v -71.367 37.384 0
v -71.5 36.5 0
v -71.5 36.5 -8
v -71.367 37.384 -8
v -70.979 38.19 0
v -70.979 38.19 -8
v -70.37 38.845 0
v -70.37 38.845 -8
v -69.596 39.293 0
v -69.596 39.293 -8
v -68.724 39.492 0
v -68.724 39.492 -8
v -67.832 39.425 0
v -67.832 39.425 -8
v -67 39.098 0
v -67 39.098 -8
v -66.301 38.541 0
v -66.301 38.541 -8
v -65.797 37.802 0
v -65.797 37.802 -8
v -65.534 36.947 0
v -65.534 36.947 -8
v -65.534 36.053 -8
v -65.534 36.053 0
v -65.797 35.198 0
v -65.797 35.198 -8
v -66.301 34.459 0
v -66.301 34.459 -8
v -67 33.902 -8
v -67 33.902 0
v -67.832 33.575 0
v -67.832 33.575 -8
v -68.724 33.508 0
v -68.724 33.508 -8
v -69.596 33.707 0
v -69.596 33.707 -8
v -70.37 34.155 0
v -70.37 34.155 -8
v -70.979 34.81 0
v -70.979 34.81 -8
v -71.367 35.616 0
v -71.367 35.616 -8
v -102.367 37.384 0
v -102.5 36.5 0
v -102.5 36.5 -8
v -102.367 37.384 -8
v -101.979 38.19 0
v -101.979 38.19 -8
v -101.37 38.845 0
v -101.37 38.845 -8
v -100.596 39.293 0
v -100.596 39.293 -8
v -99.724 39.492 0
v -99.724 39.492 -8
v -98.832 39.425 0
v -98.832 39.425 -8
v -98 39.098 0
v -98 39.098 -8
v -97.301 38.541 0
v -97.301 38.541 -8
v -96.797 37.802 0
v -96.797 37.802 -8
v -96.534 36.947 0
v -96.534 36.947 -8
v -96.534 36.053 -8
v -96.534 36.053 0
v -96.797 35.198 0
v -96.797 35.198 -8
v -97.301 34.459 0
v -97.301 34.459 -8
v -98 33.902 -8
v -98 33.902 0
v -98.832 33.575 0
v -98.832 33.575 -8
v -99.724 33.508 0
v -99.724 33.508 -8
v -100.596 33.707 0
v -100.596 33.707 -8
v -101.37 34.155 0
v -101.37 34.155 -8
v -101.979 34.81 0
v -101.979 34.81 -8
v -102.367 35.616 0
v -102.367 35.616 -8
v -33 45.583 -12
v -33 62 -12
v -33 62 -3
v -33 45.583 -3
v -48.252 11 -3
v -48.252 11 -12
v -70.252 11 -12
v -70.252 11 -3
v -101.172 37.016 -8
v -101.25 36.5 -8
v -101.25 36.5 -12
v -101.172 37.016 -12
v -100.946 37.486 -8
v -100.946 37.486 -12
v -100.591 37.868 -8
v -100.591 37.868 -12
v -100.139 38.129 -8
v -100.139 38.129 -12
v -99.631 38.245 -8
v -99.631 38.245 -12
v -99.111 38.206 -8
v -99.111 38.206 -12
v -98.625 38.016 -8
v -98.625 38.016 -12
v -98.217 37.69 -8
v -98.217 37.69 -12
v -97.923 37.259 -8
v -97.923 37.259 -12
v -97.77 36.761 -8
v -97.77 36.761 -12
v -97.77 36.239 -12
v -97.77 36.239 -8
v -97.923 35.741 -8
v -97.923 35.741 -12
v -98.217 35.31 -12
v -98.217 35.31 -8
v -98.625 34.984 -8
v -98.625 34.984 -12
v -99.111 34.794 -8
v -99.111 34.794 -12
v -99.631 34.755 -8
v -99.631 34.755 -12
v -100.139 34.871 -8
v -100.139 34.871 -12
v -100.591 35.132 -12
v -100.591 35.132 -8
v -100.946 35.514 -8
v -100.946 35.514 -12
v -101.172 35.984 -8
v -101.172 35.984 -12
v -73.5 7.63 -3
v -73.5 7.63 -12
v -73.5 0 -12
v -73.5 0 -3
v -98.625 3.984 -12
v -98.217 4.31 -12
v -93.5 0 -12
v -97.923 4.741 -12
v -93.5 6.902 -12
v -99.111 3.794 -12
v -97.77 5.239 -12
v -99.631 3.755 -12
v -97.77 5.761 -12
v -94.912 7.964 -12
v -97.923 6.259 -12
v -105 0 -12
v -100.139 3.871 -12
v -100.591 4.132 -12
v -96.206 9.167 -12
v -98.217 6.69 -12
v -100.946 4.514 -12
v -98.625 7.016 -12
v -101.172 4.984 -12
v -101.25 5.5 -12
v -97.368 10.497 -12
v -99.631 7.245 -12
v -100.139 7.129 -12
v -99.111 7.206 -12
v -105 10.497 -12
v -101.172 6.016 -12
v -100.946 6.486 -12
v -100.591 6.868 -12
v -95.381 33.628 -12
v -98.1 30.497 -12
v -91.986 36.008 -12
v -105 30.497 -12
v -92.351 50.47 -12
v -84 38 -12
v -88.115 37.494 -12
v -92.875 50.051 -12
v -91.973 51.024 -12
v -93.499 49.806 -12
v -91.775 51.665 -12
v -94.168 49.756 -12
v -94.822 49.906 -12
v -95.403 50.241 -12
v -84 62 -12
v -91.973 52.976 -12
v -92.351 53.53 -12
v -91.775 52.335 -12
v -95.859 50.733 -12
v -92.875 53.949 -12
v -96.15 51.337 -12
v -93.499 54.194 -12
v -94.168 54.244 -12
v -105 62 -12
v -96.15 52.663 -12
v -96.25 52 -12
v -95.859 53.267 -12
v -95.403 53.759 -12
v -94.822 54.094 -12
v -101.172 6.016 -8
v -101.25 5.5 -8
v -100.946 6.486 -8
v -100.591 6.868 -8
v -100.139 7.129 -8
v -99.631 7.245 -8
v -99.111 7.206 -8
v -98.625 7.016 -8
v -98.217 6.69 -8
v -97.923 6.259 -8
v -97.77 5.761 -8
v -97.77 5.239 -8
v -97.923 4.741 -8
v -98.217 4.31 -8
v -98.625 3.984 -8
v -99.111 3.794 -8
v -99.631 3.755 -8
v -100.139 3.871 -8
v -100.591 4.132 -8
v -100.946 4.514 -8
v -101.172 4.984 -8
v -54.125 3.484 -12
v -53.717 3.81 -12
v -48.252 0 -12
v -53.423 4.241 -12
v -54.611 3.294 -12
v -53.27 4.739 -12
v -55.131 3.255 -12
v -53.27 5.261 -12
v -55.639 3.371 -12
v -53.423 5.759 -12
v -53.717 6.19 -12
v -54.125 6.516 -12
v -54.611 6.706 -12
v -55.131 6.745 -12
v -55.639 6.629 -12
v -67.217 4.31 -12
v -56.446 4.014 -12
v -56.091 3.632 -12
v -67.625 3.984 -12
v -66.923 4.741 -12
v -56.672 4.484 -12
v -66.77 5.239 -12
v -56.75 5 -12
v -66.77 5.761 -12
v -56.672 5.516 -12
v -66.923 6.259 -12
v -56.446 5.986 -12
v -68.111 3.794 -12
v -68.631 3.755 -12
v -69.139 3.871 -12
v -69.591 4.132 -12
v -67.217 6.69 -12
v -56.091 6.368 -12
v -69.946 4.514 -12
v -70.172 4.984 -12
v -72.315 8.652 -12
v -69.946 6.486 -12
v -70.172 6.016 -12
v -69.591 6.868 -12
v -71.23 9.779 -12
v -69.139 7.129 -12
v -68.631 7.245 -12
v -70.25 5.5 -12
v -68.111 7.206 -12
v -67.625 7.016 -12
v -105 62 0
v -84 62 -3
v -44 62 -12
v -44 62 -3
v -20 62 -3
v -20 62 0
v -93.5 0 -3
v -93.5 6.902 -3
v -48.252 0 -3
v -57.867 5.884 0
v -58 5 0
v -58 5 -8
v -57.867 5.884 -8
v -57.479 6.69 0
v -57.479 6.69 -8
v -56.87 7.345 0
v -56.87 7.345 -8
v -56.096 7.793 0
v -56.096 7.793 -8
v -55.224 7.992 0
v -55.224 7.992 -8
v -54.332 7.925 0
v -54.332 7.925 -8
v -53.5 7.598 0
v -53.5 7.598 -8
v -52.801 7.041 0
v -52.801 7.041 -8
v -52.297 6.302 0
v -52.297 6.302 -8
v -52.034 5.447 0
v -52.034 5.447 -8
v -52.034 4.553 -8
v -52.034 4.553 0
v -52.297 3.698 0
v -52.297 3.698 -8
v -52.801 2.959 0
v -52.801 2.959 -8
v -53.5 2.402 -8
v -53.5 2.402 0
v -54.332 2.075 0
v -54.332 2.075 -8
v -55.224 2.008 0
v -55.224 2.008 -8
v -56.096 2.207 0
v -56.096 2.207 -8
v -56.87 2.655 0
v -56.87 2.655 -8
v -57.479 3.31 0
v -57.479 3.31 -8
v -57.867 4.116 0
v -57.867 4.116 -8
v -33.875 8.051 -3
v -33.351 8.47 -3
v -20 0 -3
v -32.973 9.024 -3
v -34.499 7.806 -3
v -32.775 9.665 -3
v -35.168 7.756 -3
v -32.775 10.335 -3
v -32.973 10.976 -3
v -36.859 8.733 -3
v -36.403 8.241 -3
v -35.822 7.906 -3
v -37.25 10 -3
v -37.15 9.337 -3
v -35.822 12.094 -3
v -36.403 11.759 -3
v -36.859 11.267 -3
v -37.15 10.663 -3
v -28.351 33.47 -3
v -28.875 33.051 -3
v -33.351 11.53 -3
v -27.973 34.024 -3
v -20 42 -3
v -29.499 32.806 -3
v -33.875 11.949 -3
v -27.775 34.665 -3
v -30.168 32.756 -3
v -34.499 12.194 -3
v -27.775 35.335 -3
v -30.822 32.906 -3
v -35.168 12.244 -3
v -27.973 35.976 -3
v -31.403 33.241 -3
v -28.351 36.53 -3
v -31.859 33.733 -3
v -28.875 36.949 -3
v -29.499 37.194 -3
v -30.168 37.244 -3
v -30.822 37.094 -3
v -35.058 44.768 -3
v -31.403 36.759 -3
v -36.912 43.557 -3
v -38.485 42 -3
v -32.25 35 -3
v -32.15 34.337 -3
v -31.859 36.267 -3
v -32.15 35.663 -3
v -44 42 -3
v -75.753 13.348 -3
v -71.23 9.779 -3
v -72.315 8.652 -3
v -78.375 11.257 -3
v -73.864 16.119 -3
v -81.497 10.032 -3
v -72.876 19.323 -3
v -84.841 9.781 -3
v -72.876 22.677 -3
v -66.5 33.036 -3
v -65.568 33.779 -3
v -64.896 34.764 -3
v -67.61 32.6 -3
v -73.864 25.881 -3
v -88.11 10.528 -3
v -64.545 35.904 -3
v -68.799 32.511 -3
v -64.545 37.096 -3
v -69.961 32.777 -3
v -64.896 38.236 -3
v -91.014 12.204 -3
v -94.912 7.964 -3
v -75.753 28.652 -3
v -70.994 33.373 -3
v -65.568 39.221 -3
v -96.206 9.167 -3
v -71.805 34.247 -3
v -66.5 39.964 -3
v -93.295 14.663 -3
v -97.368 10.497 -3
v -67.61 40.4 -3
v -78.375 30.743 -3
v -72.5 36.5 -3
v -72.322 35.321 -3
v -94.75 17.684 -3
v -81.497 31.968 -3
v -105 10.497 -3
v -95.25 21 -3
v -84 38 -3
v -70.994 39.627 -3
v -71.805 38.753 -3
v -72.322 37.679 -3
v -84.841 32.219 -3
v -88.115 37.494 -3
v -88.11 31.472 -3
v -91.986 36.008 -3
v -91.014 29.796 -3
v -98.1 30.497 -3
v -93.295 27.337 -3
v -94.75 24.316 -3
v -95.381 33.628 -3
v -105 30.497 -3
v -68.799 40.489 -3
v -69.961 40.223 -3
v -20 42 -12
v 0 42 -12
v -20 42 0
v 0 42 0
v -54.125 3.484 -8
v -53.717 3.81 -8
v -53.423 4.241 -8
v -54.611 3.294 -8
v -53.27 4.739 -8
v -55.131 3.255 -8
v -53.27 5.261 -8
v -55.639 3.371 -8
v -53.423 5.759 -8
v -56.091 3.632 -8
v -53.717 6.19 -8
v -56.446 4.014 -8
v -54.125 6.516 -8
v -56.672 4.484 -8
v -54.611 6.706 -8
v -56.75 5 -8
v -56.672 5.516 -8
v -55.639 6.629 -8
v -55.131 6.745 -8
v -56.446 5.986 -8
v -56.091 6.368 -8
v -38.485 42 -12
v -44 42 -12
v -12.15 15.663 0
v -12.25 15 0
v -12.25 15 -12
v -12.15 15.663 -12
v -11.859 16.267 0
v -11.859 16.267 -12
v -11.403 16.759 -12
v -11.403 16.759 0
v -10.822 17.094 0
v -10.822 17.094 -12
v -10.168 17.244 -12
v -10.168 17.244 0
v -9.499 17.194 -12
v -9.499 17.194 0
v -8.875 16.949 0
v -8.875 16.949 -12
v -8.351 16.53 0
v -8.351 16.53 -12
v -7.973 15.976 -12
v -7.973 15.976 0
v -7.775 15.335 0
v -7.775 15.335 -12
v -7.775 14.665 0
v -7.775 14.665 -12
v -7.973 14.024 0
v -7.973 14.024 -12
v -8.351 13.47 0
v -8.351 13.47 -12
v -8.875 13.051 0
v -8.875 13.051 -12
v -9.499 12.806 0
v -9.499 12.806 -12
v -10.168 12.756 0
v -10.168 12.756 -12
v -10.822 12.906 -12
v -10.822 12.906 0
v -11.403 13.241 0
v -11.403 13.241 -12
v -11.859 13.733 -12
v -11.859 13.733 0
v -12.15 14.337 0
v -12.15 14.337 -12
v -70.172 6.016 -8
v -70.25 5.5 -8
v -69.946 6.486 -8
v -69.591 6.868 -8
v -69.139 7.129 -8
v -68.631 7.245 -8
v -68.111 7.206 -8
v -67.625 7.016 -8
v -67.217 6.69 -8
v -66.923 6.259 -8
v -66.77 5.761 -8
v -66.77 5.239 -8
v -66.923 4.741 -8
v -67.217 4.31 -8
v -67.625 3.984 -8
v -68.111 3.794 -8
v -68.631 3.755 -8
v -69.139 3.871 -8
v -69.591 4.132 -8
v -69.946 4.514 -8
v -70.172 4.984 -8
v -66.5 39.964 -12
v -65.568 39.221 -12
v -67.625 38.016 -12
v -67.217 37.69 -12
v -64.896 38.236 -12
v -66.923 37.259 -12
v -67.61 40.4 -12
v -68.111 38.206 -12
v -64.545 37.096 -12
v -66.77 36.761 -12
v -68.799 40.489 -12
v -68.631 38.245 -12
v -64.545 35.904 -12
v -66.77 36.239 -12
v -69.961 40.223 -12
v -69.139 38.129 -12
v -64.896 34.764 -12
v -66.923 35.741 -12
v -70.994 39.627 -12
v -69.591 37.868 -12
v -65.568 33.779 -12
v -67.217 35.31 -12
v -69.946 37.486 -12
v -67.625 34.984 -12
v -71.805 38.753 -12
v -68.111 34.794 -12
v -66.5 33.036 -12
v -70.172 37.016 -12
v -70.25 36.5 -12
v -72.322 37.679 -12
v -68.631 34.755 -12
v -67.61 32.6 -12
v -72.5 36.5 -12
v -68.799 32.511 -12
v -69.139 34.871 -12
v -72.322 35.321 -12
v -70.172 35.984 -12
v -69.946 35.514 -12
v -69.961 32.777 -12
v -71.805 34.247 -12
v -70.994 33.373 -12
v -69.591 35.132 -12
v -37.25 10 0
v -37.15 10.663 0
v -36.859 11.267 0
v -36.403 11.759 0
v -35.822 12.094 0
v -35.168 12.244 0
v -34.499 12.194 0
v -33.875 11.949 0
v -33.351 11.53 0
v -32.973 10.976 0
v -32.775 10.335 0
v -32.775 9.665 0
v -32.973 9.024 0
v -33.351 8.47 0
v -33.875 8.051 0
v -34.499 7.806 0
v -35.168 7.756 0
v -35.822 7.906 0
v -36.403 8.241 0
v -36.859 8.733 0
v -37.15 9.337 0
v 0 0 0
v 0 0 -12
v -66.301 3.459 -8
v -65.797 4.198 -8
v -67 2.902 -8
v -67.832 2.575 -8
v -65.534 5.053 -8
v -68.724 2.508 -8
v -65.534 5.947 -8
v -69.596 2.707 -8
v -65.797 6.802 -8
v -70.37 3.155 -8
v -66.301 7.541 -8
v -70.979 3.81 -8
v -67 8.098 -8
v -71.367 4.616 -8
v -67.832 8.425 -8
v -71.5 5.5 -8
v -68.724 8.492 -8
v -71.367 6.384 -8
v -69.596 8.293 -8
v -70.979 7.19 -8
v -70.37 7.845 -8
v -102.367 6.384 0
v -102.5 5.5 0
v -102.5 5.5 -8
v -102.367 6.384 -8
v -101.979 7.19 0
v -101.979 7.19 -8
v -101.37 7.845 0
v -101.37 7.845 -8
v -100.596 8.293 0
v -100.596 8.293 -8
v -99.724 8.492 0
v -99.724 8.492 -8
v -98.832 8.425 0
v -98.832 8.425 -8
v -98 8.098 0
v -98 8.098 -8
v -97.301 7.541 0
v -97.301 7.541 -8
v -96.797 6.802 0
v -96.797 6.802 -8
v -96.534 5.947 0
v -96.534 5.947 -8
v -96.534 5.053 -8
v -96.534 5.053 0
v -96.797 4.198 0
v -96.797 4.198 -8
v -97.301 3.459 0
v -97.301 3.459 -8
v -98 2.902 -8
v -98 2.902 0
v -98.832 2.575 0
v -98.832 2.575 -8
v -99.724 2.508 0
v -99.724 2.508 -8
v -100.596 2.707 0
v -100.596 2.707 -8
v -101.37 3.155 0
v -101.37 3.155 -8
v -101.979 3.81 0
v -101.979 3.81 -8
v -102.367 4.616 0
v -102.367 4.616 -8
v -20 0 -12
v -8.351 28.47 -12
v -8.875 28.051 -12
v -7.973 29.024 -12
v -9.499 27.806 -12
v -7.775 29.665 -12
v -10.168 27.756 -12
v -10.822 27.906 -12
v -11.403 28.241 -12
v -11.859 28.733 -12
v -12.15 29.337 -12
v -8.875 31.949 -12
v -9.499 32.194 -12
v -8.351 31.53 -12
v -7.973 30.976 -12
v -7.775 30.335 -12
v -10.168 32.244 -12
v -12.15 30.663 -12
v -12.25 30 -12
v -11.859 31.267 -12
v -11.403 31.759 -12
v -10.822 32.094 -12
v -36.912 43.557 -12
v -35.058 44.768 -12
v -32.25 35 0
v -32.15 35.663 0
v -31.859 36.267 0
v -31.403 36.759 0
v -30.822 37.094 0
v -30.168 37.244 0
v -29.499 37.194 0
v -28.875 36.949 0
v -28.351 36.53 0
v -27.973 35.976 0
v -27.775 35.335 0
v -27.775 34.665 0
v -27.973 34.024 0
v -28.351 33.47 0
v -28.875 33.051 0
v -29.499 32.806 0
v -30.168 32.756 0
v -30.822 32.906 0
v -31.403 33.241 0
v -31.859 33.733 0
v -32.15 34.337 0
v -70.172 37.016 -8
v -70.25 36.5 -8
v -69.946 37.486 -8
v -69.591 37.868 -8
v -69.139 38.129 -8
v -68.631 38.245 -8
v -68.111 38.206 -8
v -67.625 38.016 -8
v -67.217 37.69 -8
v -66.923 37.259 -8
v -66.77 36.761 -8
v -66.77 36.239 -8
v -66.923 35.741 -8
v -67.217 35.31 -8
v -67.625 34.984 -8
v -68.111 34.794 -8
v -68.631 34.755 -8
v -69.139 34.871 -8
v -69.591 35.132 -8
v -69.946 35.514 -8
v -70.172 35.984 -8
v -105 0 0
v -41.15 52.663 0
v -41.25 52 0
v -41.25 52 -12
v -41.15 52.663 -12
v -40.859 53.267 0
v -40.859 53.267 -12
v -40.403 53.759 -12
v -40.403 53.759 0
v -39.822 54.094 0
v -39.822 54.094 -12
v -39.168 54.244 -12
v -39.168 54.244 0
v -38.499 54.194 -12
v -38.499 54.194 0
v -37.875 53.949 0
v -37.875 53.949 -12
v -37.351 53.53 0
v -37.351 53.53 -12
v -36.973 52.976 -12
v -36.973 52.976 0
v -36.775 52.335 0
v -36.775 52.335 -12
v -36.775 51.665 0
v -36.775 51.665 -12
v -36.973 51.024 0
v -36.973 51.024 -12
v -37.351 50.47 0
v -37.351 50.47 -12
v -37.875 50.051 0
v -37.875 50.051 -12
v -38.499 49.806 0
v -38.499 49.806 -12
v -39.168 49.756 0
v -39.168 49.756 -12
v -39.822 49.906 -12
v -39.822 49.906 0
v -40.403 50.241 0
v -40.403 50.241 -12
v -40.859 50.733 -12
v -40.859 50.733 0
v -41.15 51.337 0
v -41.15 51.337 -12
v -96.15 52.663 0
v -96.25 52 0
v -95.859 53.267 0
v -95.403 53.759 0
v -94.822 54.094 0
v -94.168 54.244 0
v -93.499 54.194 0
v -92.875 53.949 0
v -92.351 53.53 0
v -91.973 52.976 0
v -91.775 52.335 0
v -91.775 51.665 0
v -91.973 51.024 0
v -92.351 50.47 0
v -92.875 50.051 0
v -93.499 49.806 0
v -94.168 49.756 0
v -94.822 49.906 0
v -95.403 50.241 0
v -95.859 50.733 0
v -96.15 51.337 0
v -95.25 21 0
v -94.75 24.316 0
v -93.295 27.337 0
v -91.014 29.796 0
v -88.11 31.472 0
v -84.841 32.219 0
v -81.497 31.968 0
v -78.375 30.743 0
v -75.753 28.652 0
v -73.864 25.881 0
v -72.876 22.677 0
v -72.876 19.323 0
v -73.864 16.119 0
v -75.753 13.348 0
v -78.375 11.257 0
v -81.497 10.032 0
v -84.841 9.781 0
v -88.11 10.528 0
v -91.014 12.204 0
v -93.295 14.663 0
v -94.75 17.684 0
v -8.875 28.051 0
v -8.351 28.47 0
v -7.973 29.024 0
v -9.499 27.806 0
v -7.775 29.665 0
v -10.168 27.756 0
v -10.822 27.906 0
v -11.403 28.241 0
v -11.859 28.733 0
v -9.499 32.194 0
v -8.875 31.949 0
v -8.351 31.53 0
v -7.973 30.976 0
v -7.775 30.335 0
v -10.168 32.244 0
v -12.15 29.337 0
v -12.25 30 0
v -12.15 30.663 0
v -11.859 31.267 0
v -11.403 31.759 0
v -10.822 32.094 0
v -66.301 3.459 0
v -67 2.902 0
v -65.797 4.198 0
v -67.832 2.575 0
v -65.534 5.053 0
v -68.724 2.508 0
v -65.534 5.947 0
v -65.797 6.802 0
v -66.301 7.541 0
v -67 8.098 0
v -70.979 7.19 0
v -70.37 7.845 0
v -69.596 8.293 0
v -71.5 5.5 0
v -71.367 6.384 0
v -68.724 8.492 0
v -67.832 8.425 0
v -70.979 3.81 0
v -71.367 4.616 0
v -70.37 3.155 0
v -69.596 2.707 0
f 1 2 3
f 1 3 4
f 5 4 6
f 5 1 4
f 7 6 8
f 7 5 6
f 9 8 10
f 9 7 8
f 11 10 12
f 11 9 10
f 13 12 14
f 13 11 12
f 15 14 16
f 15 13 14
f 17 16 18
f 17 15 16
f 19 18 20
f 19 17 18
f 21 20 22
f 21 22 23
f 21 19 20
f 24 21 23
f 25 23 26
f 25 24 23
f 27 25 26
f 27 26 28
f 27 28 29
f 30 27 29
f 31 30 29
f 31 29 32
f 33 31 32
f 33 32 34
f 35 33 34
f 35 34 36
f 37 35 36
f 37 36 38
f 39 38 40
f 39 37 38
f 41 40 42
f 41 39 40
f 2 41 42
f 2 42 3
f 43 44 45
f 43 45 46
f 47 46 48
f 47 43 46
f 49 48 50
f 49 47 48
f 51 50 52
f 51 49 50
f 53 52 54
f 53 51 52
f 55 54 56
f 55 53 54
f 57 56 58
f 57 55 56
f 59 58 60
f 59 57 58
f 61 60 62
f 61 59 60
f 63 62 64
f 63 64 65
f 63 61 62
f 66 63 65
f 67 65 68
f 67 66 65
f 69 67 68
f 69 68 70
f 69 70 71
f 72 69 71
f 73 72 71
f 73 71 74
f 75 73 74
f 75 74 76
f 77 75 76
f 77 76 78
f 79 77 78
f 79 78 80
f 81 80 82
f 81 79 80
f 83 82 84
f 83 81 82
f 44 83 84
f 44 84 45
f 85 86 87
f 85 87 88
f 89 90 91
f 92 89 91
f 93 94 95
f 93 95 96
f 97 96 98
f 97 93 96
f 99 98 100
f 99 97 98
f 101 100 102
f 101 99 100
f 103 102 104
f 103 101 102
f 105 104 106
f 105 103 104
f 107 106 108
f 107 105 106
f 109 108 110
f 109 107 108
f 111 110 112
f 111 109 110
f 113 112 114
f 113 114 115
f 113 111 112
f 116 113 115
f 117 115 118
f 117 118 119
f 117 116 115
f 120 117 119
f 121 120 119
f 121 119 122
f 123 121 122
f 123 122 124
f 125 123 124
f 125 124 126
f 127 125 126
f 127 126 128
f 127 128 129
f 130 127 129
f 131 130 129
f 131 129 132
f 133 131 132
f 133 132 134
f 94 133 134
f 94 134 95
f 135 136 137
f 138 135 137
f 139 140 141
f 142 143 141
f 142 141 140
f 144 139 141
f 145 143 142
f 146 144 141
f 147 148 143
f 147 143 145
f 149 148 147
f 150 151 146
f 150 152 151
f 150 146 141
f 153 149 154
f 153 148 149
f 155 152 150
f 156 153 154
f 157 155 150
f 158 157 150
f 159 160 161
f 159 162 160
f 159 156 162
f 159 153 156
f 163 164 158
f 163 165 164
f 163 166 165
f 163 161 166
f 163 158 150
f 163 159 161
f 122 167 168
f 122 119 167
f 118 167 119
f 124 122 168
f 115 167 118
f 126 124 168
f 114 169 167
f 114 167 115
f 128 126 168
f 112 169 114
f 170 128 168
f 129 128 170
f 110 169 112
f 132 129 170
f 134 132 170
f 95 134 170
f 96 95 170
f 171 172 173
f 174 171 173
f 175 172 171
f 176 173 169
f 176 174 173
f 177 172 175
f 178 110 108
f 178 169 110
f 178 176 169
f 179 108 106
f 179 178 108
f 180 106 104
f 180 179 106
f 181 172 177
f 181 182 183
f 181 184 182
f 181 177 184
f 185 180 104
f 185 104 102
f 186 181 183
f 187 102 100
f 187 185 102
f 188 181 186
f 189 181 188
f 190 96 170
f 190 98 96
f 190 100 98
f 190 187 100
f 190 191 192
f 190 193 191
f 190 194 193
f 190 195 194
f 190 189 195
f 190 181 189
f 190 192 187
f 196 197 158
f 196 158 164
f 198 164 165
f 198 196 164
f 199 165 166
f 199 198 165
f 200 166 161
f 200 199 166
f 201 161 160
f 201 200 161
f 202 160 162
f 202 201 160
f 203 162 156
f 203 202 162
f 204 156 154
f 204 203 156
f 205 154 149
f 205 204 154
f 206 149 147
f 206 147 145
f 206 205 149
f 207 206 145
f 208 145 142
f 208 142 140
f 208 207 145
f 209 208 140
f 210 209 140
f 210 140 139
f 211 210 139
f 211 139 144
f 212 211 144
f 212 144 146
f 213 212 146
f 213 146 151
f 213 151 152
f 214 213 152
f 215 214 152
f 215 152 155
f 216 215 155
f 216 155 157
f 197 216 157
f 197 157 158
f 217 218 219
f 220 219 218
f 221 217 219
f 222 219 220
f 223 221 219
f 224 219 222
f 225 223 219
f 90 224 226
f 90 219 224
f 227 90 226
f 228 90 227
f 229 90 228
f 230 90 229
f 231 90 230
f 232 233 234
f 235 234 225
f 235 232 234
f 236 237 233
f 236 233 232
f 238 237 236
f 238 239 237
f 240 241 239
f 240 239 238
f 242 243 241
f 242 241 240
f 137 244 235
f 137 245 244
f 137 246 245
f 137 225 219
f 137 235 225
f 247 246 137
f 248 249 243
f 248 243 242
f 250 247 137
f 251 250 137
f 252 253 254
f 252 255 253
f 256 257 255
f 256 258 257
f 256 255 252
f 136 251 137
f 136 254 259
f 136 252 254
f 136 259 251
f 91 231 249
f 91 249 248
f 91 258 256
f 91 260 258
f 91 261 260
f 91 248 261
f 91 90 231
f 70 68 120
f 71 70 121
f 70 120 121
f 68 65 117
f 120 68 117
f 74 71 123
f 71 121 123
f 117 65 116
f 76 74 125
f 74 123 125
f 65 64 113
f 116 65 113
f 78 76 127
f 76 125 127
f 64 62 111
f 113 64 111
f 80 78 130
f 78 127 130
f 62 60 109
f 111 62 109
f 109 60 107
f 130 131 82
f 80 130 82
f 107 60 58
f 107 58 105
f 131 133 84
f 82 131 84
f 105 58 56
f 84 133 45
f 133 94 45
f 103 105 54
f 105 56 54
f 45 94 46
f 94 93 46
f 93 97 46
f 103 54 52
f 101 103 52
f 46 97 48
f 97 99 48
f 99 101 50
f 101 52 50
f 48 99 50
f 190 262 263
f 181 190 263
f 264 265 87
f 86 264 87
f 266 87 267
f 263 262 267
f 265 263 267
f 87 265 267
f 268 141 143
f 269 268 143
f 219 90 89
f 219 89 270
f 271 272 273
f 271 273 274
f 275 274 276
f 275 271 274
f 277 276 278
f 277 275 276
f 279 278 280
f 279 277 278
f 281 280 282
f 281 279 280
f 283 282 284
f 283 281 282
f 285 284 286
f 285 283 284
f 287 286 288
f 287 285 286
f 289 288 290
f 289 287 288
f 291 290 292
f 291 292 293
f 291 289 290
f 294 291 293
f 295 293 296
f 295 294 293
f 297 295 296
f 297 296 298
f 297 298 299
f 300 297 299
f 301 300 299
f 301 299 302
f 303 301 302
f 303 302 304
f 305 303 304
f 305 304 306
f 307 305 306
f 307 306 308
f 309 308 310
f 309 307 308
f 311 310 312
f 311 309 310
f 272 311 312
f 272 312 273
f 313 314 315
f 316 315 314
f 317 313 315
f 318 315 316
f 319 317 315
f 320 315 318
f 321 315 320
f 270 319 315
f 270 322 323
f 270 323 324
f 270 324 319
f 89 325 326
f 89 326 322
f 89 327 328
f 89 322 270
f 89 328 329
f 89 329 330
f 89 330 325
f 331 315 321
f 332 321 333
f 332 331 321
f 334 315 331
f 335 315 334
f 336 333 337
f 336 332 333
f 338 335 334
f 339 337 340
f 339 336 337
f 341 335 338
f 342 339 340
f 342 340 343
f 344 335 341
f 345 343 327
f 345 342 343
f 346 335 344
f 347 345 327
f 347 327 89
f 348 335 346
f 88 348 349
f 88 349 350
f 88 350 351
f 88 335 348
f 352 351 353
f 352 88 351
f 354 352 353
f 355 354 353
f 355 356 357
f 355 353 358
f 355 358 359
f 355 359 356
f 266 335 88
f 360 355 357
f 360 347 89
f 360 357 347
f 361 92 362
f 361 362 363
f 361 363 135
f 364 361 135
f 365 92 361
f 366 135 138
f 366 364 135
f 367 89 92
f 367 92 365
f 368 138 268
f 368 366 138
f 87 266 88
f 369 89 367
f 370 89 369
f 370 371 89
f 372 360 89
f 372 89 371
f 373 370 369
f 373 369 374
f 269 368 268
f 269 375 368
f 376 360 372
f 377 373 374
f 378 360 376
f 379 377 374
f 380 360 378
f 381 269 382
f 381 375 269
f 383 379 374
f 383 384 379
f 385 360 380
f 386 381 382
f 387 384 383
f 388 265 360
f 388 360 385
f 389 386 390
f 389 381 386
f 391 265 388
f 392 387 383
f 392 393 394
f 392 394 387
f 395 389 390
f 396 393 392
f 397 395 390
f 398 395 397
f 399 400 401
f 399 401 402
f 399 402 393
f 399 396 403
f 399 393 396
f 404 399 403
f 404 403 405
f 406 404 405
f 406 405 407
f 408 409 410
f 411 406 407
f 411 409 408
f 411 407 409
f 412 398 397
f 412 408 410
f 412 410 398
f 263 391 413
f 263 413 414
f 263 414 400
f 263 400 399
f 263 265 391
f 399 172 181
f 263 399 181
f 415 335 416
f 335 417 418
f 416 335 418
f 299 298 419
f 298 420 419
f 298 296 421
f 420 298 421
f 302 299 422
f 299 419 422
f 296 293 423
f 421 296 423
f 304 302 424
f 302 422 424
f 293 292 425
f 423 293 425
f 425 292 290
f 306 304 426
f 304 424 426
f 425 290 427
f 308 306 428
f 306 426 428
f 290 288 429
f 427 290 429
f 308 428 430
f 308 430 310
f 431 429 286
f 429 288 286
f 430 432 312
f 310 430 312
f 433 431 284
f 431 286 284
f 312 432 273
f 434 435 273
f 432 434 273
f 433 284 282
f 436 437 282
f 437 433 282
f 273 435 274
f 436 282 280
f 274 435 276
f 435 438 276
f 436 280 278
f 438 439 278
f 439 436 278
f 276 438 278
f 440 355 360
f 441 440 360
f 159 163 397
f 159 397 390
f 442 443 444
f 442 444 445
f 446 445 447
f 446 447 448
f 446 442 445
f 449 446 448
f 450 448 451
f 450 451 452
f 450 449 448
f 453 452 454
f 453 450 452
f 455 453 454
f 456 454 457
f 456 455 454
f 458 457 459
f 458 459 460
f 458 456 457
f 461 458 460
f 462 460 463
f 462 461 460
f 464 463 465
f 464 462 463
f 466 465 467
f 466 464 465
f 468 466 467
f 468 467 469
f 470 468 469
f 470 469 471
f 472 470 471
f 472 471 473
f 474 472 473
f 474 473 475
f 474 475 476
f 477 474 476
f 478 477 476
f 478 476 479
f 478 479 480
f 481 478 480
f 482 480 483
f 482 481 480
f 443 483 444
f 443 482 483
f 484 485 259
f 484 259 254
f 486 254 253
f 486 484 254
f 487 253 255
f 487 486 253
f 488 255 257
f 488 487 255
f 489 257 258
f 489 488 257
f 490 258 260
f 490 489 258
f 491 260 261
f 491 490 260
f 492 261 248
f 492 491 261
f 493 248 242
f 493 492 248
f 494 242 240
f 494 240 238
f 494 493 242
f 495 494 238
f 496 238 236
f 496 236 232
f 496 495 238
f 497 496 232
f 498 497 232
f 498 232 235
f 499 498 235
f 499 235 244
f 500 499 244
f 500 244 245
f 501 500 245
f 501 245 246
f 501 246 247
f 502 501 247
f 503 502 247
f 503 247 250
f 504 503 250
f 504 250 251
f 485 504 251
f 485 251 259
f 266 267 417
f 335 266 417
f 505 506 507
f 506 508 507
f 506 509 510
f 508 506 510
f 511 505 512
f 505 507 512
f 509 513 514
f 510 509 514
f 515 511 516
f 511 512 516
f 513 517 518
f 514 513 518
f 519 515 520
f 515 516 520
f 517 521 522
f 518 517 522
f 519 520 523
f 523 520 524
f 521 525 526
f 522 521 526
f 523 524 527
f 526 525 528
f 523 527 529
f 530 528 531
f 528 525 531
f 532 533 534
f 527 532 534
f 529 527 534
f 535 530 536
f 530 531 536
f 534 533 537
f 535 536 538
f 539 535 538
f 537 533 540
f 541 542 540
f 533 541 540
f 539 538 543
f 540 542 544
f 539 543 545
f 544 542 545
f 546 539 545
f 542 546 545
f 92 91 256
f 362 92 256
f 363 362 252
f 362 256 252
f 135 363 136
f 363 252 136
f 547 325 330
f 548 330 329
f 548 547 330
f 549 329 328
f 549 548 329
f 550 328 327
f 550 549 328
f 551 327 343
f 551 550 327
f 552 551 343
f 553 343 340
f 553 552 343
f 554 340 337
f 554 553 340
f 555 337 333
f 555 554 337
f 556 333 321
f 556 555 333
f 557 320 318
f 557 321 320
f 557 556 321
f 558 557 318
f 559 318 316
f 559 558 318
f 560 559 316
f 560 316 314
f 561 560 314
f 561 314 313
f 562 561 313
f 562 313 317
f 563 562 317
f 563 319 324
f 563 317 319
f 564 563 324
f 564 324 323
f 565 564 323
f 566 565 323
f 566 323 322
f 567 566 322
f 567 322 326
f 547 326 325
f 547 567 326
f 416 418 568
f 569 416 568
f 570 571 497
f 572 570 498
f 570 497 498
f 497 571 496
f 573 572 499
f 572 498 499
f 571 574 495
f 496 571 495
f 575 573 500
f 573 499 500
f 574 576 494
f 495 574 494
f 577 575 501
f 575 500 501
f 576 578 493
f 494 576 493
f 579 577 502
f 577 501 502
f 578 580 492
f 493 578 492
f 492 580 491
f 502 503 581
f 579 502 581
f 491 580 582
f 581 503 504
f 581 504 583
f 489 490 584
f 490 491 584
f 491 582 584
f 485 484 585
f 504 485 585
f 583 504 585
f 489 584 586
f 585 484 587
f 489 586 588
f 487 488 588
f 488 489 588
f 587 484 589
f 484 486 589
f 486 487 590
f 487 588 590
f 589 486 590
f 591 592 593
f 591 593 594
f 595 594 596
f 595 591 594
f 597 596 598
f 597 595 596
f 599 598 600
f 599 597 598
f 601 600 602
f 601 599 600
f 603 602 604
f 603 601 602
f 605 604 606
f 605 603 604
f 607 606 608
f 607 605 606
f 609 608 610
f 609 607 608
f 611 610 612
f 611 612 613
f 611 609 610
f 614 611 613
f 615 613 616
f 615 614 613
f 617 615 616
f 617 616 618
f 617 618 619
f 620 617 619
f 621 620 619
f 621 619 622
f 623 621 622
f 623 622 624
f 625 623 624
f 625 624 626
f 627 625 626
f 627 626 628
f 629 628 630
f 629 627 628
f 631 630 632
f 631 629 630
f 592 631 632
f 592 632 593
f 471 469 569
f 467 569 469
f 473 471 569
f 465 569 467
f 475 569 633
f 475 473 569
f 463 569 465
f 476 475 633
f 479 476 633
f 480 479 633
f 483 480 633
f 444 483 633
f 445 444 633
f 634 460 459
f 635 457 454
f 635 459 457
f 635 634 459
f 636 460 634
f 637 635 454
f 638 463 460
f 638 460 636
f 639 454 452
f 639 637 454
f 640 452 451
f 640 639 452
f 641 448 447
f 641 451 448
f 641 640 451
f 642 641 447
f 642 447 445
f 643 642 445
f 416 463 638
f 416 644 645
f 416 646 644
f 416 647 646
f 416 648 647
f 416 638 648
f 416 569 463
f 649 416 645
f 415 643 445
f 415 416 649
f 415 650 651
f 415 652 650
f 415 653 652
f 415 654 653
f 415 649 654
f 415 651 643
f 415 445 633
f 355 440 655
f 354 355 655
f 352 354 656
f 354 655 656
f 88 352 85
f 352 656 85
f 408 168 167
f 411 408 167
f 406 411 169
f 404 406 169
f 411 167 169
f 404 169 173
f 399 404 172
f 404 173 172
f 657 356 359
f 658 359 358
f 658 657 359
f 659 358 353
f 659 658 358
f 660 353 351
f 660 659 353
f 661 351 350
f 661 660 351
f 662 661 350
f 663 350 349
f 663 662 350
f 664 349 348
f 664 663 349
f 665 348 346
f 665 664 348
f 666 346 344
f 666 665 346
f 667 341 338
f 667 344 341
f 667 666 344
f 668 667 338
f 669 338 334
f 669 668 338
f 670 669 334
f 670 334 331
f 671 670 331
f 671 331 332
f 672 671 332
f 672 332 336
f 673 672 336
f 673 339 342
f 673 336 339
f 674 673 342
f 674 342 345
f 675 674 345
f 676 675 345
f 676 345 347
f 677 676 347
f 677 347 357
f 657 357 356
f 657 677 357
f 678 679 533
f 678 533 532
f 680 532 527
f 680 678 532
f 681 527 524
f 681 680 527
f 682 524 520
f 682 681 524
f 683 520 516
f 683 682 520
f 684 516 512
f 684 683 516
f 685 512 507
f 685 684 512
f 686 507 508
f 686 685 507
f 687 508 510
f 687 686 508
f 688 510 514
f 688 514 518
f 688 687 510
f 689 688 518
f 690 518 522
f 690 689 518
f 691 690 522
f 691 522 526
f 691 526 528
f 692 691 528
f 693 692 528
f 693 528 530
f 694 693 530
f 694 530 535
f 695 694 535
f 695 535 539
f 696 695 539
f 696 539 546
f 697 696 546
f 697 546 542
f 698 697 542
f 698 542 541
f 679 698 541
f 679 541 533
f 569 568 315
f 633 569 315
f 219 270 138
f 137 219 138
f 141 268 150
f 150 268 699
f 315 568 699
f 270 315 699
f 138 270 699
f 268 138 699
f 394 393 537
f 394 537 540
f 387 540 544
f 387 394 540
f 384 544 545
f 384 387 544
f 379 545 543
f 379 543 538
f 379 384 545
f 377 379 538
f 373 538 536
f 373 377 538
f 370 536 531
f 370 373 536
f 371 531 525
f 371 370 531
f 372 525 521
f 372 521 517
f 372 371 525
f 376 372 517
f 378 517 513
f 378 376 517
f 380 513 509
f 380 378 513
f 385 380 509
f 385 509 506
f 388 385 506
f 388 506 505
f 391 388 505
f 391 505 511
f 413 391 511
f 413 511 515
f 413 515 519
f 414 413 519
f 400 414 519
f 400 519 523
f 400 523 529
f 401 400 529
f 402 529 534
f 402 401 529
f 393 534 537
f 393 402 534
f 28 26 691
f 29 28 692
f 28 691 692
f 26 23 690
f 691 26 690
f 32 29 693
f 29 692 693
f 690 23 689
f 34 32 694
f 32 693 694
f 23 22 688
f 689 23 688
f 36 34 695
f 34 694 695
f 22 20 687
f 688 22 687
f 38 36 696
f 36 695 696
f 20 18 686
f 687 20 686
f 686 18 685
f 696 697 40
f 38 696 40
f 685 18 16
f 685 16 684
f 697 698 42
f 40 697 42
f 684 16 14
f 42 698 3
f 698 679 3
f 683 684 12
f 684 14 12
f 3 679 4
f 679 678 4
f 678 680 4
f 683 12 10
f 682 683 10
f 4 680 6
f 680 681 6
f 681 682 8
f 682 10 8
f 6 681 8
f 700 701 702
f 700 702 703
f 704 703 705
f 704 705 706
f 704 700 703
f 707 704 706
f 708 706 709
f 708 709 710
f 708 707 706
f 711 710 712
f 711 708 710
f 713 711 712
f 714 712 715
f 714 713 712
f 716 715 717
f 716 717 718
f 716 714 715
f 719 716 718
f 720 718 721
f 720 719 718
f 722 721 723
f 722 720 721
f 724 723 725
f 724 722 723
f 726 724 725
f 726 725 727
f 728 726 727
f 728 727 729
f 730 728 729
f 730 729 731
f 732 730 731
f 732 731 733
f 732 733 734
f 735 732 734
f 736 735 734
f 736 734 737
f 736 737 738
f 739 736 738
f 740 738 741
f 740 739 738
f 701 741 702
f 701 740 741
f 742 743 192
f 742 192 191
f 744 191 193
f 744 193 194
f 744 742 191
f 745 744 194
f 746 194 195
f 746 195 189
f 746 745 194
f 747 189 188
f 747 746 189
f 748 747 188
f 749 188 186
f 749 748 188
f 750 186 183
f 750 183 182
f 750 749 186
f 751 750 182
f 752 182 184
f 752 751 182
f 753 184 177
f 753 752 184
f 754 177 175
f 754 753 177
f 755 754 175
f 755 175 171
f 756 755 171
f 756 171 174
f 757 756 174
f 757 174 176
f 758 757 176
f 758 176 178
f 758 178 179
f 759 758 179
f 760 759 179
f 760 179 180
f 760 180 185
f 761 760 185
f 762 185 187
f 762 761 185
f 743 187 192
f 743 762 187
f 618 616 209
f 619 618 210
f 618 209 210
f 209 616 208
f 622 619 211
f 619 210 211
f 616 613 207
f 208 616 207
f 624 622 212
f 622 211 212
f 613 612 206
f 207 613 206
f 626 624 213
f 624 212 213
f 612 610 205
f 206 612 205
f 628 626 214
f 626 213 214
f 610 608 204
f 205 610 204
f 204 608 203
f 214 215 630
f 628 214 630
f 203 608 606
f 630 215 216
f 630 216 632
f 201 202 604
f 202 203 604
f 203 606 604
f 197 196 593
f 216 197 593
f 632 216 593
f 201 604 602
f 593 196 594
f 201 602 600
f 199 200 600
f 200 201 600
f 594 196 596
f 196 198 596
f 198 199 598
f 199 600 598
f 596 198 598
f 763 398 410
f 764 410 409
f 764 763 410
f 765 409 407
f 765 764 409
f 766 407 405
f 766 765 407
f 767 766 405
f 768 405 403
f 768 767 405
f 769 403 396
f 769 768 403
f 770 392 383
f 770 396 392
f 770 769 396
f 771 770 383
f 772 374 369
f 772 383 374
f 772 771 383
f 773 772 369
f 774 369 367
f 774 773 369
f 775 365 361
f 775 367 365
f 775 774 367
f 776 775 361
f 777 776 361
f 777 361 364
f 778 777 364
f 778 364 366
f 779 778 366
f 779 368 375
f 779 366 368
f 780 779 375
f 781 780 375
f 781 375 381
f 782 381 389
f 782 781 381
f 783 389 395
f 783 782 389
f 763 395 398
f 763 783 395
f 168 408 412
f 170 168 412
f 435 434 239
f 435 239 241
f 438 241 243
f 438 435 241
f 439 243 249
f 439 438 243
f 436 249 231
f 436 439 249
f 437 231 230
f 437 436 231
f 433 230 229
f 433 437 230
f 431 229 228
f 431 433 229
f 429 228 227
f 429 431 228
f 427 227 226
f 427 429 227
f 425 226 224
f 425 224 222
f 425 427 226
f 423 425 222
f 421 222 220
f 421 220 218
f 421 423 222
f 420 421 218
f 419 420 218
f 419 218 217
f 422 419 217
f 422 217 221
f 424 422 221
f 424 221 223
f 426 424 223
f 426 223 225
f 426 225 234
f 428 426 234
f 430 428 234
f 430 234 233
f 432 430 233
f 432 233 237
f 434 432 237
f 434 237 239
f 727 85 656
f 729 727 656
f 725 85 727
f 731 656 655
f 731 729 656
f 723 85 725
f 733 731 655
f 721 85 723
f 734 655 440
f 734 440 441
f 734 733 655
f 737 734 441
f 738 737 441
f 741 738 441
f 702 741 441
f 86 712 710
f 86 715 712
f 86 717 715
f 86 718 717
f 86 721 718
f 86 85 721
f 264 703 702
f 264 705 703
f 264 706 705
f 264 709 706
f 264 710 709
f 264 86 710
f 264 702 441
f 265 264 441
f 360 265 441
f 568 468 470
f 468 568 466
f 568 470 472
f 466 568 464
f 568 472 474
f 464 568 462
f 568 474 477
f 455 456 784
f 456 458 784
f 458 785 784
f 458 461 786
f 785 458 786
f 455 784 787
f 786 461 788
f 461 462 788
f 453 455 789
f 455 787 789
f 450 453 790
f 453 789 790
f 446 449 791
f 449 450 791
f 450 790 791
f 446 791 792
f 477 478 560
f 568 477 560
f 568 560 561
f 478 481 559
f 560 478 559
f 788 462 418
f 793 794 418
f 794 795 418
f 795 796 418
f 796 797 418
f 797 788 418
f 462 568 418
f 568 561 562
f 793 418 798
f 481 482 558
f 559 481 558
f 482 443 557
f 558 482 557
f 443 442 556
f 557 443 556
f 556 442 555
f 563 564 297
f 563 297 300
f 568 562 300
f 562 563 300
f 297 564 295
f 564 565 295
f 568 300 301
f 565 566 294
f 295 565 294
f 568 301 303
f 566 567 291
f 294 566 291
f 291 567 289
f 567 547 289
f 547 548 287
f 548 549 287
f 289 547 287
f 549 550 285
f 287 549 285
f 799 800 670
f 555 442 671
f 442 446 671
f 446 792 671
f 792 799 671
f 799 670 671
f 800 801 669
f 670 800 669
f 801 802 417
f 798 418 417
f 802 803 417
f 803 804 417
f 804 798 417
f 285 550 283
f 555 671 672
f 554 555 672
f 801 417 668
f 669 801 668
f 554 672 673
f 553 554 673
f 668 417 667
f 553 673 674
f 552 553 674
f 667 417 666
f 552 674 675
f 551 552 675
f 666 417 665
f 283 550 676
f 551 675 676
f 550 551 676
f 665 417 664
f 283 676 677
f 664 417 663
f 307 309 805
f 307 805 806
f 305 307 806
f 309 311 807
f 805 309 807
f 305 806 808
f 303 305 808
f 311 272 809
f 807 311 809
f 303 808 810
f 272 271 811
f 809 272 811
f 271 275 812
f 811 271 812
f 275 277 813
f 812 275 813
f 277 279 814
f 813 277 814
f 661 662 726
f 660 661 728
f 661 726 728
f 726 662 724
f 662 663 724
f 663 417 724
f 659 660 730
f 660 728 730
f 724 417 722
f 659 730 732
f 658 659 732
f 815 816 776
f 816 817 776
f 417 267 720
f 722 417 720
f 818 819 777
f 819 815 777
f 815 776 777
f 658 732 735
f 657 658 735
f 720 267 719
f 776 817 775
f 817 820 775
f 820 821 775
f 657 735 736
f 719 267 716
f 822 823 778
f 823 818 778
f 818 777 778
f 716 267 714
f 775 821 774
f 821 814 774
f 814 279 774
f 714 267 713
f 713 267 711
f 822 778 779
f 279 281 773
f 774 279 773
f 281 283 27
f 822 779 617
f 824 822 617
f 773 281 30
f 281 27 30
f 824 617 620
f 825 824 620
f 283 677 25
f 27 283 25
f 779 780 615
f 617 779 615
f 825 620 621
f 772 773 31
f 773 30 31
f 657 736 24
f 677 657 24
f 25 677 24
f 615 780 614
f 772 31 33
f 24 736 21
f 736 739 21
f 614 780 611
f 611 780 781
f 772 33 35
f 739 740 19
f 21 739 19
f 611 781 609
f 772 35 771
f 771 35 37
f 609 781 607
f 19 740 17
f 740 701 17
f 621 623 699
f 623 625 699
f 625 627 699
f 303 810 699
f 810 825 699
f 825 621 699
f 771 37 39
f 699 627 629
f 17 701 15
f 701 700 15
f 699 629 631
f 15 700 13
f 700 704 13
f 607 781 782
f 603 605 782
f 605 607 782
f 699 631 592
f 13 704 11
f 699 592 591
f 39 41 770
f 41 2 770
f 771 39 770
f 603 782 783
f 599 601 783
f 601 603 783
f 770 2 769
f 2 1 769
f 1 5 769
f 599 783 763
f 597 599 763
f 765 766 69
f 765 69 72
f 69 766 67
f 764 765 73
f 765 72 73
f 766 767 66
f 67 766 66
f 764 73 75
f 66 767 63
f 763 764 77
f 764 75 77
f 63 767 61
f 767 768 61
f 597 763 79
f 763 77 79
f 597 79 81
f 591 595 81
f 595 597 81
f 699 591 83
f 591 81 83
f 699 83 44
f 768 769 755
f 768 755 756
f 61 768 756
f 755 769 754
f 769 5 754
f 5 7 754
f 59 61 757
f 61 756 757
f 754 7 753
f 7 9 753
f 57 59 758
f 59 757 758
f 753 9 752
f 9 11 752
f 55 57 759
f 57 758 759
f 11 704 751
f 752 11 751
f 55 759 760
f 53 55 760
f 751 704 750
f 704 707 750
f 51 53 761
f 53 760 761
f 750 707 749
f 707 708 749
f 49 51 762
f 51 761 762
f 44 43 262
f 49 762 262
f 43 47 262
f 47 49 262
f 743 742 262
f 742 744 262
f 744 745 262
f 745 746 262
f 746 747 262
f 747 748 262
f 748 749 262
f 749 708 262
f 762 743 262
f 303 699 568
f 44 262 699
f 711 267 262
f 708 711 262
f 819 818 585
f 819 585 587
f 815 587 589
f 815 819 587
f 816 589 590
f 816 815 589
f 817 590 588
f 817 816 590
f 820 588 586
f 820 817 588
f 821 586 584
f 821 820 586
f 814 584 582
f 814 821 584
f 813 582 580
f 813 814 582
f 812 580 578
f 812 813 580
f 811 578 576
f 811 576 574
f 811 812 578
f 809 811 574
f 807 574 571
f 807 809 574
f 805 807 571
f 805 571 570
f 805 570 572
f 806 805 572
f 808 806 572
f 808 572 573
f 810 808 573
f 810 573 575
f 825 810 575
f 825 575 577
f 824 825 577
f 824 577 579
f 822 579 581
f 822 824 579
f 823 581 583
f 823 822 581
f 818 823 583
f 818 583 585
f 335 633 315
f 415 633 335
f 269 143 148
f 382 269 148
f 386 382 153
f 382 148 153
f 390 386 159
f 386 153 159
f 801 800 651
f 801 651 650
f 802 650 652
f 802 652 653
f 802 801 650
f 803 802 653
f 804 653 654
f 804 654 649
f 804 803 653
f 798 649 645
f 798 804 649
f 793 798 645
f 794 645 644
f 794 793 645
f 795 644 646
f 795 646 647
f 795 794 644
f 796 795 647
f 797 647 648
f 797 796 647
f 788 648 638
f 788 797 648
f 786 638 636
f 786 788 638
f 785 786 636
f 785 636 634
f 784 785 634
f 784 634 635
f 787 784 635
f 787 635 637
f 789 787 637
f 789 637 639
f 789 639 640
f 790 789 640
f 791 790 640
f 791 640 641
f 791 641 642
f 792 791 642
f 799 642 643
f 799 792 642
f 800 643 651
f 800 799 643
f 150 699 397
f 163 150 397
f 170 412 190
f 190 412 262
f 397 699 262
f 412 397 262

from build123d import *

# Parameters (mm, degrees)
SKETCH_R        = 2.25
SKETCH_R_2      = 11.25
SKETCH_R_3      = 1.75
PAD_DEPTH       = 12
POCKET_DEPTH    = 9
SKETCH002_R     = 4
PAD001_DEPTH    = 9
SKETCH003_R     = 3
POCKET001_DEPTH = 8
SKETCH004_R     = 1.75
POCKET002_DEPTH = 10


with BuildPart() as pocket_belt_path:
    # Sketch → Pad (new body)
    with BuildSketch(Plane.XY):
        Polygon((0, 0), (105, 0), (105, 62), (20, 62), (20, 42), (0, 42), align=None)
        with Locations((35, 10)):
            Circle(SKETCH_R, mode=Mode.SUBTRACT)
        with Locations((30, 35)):
            Circle(SKETCH_R, mode=Mode.SUBTRACT)
        with Locations((84, 21)):
            Circle(SKETCH_R_2, mode=Mode.SUBTRACT)
        with Locations((68.5, 36.5)):
            Circle(SKETCH_R_3, mode=Mode.SUBTRACT)
        with Locations((99.5, 36.5)):
            Circle(SKETCH_R_3, mode=Mode.SUBTRACT)
        with Locations((68.5, 5.5)):
            Circle(SKETCH_R_3, mode=Mode.SUBTRACT)
        with Locations((99.5, 5.5)):
            Circle(SKETCH_R_3, mode=Mode.SUBTRACT)
        with Locations((10, 30)):
            Circle(SKETCH_R, mode=Mode.SUBTRACT)
        with Locations((10, 15)):
            Circle(SKETCH_R, mode=Mode.SUBTRACT)
        with Locations((39, 52)):
            Circle(SKETCH_R, mode=Mode.SUBTRACT)
        with Locations((94, 52)):
            Circle(SKETCH_R, mode=Mode.SUBTRACT)
        with Locations((55, 5)):
            Circle(SKETCH_R_3, mode=Mode.SUBTRACT)
    extrude(amount=PAD_DEPTH)

    # Sketch001 → Pocket (cut)
    with BuildSketch(Plane.XY.offset(12)):
        with BuildLine():
            ThreePointArc((38.485281, 42), (36.015595, 44.209377), (32.999996, 45.583006))
            Line((32.999996, 67), (32.999996, 45.583006))
            Line((20, 67), (32.999996, 67))
            Line((20, -1), (20, 67))
            Line((20, -1), (48.252269, -1))
            Line((48.252269, 11), (48.252269, -1))
            Line((48.252269, 11), (70.252269, 11))
            ThreePointArc((70.252269, 11), (71.759618, 9.202833), (73.499996, 7.630258))
            Line((73.499996, 7.630258), (73.499996, -1))
            Line((73.499996, -1), (93.499996, -1))
            Line((93.499996, -1), (93.499996, 6.902128))
            ThreePointArc((93.499996, 6.902128), (95.574295, 8.548671), (97.367695, 10.497399))
            Line((105.499996, 10.497399), (97.367695, 10.497399))
            Line((105.499996, 30.497399), (105.499996, 10.497399))
            Line((98.099621, 30.497399), (105.499996, 30.497399))
            ThreePointArc((98.099621, 30.497399), (91.98574, 36.007594), (83.999996, 38))
            Line((83.999996, 38), (83.999996, 67))
            Line((83.999996, 67), (43.999996, 67))
            Line((43.999996, 67), (43.999996, 42))
            Line((38.485281, 42), (43.999996, 42))
        make_face()
    extrude(amount=-POCKET_DEPTH, mode=Mode.SUBTRACT)


with BuildPart() as pocket002:
    # Part__Mirroring: instance of Pocket belt path
    add(pocket_belt_path.part.mirror(Plane(origin=(0, 0, 0), x_dir=(0, 1, 0), z_dir=(0, 0, 1))))

    # Sketch002 → Pad001 (new body)
    with BuildSketch(Plane(origin=(0, 0, -3), x_dir=(1, 0, 0), z_dir=(0, 0, -1))):
        with Locations((68.5, -36.5)):
            Circle(SKETCH002_R)
    extrude(amount=PAD001_DEPTH)

    # Sketch003 → Pocket001 (cut)
    with BuildSketch(Plane.XY):
        with Locations((55, 5)):
            Circle(SKETCH003_R)
        with Locations((68.5, 36.5)):
            Circle(SKETCH003_R)
        with Locations((68.5, 5.5)):
            Circle(SKETCH003_R)
        with Locations((99.5, 5.5)):
            Circle(SKETCH003_R)
        with Locations((99.5, 36.5)):
            Circle(SKETCH003_R)
    extrude(amount=-POCKET001_DEPTH, mode=Mode.SUBTRACT)

    # Sketch004 → Pocket002 (cut)
    with BuildSketch(Plane.XY.offset(-8)):
        with Locations((68.5, 36.5)):
            Circle(SKETCH004_R)
    extrude(amount=-POCKET002_DEPTH, mode=Mode.SUBTRACT)


with BuildPart() as part_mirroring001:
    # Part__Mirroring001: instance of Pocket002
    add(pocket002.part.mirror(Plane(origin=(0, 0, 0), x_dir=(0, -1, 0), z_dir=(1, 0, 0))))


solid = part_mirroring001.part
